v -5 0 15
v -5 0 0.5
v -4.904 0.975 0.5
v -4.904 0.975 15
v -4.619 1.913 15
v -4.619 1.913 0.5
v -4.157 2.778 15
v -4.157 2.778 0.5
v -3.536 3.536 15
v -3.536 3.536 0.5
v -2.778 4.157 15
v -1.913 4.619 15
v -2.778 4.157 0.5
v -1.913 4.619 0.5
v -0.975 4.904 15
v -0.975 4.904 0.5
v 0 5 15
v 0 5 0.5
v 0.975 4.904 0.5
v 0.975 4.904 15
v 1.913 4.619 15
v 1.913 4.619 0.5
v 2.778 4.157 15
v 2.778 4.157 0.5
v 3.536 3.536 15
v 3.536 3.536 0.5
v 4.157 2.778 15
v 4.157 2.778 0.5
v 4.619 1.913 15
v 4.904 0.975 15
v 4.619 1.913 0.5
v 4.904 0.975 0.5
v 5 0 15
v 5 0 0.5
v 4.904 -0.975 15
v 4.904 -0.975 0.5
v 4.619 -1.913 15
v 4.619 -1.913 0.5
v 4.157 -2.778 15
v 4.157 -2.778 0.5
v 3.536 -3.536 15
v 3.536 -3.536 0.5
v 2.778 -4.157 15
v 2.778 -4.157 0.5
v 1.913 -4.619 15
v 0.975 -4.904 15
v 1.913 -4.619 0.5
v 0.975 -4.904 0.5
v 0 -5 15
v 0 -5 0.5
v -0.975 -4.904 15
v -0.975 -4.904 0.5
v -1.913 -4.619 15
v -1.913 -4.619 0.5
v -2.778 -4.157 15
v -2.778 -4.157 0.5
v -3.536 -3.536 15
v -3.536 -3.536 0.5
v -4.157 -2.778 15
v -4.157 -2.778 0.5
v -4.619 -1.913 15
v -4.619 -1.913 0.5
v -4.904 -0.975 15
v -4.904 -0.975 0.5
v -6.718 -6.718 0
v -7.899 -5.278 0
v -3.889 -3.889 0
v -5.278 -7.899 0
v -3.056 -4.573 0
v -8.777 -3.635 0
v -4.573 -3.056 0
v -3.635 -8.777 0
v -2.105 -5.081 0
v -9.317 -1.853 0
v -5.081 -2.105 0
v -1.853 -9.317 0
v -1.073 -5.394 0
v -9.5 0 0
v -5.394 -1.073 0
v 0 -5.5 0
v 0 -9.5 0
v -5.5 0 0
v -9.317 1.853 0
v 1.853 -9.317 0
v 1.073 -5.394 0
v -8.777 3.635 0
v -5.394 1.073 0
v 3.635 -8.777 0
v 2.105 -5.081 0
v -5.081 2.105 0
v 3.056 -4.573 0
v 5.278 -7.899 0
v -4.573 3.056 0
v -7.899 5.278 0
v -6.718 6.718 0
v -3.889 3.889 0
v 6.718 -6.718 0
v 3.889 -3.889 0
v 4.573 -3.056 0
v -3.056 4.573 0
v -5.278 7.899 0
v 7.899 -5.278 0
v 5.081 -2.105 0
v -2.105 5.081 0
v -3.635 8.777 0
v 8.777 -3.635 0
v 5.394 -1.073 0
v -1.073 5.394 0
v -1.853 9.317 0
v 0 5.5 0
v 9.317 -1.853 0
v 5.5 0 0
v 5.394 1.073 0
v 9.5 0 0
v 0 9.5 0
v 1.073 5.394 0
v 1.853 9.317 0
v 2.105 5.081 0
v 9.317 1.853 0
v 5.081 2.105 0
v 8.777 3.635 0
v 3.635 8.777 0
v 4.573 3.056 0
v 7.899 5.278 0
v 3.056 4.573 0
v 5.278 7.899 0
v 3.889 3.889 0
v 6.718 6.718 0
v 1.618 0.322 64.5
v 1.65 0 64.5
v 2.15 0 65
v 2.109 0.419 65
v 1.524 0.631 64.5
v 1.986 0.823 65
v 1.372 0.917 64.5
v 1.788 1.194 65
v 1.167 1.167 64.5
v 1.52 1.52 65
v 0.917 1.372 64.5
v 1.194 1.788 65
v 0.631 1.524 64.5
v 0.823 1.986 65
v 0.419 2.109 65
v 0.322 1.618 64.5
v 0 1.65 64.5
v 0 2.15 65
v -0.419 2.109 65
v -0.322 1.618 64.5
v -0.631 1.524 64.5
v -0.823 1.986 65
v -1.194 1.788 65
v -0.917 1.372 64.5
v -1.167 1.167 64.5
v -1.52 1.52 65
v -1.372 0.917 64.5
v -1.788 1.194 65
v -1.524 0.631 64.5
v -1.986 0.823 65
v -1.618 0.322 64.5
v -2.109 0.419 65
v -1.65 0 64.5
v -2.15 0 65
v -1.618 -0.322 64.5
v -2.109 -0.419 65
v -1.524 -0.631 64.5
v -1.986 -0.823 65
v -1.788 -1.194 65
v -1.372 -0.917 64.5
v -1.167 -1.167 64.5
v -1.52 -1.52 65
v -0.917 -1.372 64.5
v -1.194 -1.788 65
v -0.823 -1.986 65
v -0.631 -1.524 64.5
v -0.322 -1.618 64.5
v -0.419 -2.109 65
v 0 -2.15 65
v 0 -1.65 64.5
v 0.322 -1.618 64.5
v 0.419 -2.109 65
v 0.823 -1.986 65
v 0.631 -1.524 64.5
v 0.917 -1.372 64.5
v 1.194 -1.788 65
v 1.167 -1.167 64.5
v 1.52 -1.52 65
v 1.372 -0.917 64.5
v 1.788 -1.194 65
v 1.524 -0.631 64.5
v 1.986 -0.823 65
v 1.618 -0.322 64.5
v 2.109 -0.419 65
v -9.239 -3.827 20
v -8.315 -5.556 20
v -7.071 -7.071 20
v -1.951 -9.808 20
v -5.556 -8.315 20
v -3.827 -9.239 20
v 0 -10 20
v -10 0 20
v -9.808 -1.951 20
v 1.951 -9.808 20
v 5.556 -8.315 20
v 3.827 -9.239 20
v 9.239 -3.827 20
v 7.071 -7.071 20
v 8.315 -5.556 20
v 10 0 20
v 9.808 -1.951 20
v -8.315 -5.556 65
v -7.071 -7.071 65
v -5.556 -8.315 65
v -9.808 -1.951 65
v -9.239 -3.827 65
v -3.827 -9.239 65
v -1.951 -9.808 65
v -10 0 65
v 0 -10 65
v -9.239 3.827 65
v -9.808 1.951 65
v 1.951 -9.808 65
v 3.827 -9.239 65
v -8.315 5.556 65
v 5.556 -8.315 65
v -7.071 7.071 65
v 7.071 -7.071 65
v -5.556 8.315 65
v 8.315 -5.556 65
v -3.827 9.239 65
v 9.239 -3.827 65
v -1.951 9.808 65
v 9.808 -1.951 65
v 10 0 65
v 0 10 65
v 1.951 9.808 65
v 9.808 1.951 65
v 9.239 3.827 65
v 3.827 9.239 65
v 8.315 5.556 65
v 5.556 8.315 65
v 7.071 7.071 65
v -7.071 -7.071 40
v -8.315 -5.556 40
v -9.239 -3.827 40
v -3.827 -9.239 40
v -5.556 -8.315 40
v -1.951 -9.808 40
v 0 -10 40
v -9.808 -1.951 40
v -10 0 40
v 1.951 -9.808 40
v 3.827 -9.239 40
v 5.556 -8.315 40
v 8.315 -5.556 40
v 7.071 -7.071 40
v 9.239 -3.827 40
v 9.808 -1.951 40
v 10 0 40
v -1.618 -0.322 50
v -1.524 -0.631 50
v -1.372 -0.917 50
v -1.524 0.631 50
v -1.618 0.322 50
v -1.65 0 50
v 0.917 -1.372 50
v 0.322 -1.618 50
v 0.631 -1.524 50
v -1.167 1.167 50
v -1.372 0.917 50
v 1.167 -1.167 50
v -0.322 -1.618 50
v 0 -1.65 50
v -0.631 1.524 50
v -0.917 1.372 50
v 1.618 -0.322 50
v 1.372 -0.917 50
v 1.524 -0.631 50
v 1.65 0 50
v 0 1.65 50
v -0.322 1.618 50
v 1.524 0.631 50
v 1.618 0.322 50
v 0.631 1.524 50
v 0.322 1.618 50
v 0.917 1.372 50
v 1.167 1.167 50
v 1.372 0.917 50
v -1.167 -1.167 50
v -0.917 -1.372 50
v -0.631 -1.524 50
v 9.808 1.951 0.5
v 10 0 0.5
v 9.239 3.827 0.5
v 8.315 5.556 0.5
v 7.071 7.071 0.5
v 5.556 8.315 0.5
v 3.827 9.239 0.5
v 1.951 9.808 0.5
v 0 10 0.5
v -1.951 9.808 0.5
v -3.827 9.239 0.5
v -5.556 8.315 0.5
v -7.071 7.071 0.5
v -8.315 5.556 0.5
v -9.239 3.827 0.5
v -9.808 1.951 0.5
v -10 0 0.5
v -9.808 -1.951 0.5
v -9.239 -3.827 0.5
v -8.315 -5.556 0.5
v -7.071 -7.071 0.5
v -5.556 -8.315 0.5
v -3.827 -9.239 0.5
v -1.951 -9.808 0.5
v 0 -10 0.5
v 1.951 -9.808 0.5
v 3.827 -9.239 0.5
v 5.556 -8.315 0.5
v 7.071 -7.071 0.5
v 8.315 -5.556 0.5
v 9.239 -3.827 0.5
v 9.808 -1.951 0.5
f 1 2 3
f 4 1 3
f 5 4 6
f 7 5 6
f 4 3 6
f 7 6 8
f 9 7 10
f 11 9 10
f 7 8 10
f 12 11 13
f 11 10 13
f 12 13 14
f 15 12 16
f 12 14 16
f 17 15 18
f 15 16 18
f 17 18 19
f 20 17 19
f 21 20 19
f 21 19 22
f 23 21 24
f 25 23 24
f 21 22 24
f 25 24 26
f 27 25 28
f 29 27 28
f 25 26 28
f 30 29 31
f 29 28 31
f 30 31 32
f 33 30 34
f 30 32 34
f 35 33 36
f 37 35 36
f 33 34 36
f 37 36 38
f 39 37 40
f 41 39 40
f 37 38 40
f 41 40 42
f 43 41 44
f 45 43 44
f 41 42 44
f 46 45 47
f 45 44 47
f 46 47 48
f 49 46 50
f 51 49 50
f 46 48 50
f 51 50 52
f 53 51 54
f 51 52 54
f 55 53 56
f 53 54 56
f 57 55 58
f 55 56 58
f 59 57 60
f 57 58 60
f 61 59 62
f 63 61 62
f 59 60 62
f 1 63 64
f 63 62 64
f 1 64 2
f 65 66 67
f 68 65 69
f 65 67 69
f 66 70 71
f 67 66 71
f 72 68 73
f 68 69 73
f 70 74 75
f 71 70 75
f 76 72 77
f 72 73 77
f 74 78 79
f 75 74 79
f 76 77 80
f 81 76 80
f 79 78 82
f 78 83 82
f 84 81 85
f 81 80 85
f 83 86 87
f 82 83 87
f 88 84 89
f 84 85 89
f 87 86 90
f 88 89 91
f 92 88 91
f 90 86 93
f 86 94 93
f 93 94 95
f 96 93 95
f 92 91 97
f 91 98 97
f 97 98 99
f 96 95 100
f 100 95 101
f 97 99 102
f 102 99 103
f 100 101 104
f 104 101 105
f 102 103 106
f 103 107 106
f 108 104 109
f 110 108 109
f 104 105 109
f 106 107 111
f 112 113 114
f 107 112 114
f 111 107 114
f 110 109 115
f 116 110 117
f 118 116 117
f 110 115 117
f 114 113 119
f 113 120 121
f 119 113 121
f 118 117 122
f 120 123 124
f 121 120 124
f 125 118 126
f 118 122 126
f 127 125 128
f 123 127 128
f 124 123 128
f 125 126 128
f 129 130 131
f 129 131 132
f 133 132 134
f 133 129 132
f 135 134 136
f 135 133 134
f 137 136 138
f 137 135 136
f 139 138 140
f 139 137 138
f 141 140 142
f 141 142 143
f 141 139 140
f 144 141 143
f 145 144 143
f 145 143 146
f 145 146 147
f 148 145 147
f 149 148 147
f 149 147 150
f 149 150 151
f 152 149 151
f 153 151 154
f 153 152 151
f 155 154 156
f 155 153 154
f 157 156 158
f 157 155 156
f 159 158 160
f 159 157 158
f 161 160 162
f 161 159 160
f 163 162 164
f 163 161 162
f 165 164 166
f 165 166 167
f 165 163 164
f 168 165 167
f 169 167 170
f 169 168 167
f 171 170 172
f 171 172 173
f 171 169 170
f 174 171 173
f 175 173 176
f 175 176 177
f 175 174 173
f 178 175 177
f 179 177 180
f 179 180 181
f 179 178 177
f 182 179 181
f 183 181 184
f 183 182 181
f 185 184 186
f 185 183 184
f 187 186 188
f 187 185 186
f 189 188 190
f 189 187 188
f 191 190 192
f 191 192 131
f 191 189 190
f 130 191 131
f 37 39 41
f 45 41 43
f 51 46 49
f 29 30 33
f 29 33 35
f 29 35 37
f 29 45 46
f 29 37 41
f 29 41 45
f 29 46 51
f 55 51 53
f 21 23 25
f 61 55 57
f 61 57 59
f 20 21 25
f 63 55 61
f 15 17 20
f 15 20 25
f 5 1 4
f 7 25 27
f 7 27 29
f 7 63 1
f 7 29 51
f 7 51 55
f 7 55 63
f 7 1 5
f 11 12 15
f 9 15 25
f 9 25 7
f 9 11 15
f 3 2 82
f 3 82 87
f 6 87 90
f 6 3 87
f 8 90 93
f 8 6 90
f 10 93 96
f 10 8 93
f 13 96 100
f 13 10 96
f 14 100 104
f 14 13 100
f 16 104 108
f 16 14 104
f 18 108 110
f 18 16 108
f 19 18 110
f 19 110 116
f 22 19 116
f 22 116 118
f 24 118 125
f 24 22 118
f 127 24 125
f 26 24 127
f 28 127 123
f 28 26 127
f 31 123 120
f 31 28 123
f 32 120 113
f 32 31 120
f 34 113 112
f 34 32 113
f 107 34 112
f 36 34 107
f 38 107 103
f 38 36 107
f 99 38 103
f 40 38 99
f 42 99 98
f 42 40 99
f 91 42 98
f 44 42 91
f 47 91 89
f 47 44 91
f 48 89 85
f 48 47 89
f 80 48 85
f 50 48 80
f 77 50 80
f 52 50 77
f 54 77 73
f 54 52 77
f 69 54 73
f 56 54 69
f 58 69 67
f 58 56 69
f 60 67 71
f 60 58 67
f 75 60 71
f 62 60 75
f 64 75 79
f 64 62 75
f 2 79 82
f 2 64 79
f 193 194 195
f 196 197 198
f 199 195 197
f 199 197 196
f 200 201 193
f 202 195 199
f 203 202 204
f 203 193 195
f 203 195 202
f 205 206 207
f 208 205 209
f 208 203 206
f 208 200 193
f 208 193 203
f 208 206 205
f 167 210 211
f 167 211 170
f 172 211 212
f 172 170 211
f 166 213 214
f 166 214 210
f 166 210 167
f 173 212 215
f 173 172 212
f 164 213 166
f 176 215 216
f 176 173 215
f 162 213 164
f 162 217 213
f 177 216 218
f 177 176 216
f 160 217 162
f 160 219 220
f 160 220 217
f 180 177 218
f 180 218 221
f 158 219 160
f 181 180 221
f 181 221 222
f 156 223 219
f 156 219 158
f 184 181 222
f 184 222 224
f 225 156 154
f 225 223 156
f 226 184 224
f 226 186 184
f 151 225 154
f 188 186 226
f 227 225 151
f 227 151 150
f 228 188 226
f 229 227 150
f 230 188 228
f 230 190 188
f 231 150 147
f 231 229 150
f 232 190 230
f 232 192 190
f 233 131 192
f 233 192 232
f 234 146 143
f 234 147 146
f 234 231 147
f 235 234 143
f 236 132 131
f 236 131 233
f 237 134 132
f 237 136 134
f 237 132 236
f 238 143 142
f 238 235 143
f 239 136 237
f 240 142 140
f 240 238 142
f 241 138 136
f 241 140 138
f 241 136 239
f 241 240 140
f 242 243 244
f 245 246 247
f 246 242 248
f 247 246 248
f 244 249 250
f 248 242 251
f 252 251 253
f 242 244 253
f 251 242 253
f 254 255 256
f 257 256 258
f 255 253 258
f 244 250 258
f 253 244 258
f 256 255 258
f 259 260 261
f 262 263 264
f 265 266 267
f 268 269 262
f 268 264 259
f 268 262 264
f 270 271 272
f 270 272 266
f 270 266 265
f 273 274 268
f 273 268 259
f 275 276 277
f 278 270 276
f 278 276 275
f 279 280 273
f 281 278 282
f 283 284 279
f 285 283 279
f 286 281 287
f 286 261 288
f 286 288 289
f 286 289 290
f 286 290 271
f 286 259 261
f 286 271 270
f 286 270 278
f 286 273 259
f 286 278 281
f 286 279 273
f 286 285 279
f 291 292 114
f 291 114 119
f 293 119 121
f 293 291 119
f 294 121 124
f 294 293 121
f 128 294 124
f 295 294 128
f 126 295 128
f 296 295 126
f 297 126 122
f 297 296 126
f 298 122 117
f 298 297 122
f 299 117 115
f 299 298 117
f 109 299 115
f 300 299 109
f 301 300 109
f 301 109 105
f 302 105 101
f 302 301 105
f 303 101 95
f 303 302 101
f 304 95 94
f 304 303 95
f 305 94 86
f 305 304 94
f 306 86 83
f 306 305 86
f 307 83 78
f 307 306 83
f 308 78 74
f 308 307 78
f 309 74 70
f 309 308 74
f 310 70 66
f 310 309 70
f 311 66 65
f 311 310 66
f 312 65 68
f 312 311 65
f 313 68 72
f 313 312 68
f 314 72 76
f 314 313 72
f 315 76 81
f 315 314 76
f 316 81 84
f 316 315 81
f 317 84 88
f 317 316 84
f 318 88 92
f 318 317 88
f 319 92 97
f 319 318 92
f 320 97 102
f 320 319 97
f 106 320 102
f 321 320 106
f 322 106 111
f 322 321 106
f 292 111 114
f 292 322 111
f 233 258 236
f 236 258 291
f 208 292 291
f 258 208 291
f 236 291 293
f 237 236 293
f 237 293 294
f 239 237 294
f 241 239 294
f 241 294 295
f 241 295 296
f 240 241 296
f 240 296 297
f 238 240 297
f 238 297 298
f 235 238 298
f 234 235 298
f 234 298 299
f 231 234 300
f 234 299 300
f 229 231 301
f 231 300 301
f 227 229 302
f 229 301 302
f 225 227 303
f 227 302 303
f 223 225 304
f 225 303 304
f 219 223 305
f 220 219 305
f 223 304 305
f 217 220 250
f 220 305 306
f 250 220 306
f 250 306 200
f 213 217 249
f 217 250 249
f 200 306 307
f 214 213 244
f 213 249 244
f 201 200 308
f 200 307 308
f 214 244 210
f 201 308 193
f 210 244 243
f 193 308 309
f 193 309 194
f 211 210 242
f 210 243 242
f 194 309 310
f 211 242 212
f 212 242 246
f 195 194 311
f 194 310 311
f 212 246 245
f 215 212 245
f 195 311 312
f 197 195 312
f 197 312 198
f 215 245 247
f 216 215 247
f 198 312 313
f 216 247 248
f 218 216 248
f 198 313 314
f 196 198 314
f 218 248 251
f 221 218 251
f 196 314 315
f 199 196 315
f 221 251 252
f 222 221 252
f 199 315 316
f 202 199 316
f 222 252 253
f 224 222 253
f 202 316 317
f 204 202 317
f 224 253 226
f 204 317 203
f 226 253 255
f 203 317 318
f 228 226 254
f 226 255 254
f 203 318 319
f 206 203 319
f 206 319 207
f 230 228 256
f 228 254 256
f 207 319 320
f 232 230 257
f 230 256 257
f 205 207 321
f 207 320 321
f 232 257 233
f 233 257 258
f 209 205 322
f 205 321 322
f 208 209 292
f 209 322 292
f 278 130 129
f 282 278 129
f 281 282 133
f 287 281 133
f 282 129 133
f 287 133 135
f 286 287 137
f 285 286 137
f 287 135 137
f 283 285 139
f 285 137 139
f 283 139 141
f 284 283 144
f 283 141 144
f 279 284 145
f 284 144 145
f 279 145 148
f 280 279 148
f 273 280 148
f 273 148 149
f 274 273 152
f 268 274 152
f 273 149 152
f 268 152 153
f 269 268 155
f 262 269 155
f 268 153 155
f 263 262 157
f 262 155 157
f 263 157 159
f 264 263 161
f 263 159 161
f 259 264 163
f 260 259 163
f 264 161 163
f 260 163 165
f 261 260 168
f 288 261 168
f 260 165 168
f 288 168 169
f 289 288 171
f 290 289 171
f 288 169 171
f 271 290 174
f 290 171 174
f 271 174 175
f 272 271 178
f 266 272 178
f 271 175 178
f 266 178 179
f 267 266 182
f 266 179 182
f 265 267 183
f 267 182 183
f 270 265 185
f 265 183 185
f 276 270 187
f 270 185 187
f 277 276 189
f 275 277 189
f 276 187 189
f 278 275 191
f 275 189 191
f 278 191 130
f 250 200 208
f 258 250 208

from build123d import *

# Parameters (mm, degrees)
SKETCH1_R           = 10
BOSS_EXTRUDE1_DEPTH = 65
SKETCH2_R           = 1.65
CUT_EXTRUDE1_DEPTH  = 15
CHAMFER1_SIZE       = 0.5
SKETCH3_R           = 5
CUT_EXTRUDE2_DEPTH  = 15
CHAMFER2_SIZE       = 0.5
CHAMFER3_SIZE       = 0.5
SKETCH4_W           = 24.548279796
SKETCH4_H           = 20
CUT_EXTRUDE3_DEPTH  = 13


with BuildPart() as part:
    # Sketch1 → Boss-Extrude1 (new body)
    with BuildSketch(Plane.XY):
        Circle(SKETCH1_R)
    extrude(amount=BOSS_EXTRUDE1_DEPTH)

    # Sketch2 → Cut-Extrude1 (cut)
    with BuildSketch(Plane.XY.offset(65)):
        Circle(SKETCH2_R)
    extrude(amount=-CUT_EXTRUDE1_DEPTH, mode=Mode.SUBTRACT)

    # Chamfer1
    chamfer1_edges = [part.edges().sort_by_distance(p)[0] for p in [
        (-1.65, 0, 65),
    ]]
    chamfer(chamfer1_edges, length=CHAMFER1_SIZE)

    # Sketch3 → Cut-Extrude2 (cut)
    with BuildSketch(Plane(origin=(0, 0, 0), x_dir=(-1, 0, 0), z_dir=(0, 0, -1))):
        Circle(SKETCH3_R)
    extrude(amount=-CUT_EXTRUDE2_DEPTH, mode=Mode.SUBTRACT)

    # Chamfer2
    chamfer2_edges = [part.edges().sort_by_distance(p)[0] for p in [
        (5, 0, 0),
    ]]
    chamfer(chamfer2_edges, length=CHAMFER2_SIZE)

    # Chamfer3
    chamfer3_edges = [part.edges().sort_by_distance(p)[0] for p in [
        (-10, 0, 0),
    ]]
    chamfer(chamfer3_edges, length=CHAMFER3_SIZE)

    # Sketch4 → Cut-Extrude3 (cut)
    with BuildSketch(Plane(origin=(0, 0, 0), x_dir=(1, 0, 0), z_dir=(0, 1, 0))):
        with Locations((0.075917463, -30)):
            Rectangle(SKETCH4_W, SKETCH4_H)
    extrude(amount=-CUT_EXTRUDE3_DEPTH, mode=Mode.SUBTRACT)


solid = part.part
